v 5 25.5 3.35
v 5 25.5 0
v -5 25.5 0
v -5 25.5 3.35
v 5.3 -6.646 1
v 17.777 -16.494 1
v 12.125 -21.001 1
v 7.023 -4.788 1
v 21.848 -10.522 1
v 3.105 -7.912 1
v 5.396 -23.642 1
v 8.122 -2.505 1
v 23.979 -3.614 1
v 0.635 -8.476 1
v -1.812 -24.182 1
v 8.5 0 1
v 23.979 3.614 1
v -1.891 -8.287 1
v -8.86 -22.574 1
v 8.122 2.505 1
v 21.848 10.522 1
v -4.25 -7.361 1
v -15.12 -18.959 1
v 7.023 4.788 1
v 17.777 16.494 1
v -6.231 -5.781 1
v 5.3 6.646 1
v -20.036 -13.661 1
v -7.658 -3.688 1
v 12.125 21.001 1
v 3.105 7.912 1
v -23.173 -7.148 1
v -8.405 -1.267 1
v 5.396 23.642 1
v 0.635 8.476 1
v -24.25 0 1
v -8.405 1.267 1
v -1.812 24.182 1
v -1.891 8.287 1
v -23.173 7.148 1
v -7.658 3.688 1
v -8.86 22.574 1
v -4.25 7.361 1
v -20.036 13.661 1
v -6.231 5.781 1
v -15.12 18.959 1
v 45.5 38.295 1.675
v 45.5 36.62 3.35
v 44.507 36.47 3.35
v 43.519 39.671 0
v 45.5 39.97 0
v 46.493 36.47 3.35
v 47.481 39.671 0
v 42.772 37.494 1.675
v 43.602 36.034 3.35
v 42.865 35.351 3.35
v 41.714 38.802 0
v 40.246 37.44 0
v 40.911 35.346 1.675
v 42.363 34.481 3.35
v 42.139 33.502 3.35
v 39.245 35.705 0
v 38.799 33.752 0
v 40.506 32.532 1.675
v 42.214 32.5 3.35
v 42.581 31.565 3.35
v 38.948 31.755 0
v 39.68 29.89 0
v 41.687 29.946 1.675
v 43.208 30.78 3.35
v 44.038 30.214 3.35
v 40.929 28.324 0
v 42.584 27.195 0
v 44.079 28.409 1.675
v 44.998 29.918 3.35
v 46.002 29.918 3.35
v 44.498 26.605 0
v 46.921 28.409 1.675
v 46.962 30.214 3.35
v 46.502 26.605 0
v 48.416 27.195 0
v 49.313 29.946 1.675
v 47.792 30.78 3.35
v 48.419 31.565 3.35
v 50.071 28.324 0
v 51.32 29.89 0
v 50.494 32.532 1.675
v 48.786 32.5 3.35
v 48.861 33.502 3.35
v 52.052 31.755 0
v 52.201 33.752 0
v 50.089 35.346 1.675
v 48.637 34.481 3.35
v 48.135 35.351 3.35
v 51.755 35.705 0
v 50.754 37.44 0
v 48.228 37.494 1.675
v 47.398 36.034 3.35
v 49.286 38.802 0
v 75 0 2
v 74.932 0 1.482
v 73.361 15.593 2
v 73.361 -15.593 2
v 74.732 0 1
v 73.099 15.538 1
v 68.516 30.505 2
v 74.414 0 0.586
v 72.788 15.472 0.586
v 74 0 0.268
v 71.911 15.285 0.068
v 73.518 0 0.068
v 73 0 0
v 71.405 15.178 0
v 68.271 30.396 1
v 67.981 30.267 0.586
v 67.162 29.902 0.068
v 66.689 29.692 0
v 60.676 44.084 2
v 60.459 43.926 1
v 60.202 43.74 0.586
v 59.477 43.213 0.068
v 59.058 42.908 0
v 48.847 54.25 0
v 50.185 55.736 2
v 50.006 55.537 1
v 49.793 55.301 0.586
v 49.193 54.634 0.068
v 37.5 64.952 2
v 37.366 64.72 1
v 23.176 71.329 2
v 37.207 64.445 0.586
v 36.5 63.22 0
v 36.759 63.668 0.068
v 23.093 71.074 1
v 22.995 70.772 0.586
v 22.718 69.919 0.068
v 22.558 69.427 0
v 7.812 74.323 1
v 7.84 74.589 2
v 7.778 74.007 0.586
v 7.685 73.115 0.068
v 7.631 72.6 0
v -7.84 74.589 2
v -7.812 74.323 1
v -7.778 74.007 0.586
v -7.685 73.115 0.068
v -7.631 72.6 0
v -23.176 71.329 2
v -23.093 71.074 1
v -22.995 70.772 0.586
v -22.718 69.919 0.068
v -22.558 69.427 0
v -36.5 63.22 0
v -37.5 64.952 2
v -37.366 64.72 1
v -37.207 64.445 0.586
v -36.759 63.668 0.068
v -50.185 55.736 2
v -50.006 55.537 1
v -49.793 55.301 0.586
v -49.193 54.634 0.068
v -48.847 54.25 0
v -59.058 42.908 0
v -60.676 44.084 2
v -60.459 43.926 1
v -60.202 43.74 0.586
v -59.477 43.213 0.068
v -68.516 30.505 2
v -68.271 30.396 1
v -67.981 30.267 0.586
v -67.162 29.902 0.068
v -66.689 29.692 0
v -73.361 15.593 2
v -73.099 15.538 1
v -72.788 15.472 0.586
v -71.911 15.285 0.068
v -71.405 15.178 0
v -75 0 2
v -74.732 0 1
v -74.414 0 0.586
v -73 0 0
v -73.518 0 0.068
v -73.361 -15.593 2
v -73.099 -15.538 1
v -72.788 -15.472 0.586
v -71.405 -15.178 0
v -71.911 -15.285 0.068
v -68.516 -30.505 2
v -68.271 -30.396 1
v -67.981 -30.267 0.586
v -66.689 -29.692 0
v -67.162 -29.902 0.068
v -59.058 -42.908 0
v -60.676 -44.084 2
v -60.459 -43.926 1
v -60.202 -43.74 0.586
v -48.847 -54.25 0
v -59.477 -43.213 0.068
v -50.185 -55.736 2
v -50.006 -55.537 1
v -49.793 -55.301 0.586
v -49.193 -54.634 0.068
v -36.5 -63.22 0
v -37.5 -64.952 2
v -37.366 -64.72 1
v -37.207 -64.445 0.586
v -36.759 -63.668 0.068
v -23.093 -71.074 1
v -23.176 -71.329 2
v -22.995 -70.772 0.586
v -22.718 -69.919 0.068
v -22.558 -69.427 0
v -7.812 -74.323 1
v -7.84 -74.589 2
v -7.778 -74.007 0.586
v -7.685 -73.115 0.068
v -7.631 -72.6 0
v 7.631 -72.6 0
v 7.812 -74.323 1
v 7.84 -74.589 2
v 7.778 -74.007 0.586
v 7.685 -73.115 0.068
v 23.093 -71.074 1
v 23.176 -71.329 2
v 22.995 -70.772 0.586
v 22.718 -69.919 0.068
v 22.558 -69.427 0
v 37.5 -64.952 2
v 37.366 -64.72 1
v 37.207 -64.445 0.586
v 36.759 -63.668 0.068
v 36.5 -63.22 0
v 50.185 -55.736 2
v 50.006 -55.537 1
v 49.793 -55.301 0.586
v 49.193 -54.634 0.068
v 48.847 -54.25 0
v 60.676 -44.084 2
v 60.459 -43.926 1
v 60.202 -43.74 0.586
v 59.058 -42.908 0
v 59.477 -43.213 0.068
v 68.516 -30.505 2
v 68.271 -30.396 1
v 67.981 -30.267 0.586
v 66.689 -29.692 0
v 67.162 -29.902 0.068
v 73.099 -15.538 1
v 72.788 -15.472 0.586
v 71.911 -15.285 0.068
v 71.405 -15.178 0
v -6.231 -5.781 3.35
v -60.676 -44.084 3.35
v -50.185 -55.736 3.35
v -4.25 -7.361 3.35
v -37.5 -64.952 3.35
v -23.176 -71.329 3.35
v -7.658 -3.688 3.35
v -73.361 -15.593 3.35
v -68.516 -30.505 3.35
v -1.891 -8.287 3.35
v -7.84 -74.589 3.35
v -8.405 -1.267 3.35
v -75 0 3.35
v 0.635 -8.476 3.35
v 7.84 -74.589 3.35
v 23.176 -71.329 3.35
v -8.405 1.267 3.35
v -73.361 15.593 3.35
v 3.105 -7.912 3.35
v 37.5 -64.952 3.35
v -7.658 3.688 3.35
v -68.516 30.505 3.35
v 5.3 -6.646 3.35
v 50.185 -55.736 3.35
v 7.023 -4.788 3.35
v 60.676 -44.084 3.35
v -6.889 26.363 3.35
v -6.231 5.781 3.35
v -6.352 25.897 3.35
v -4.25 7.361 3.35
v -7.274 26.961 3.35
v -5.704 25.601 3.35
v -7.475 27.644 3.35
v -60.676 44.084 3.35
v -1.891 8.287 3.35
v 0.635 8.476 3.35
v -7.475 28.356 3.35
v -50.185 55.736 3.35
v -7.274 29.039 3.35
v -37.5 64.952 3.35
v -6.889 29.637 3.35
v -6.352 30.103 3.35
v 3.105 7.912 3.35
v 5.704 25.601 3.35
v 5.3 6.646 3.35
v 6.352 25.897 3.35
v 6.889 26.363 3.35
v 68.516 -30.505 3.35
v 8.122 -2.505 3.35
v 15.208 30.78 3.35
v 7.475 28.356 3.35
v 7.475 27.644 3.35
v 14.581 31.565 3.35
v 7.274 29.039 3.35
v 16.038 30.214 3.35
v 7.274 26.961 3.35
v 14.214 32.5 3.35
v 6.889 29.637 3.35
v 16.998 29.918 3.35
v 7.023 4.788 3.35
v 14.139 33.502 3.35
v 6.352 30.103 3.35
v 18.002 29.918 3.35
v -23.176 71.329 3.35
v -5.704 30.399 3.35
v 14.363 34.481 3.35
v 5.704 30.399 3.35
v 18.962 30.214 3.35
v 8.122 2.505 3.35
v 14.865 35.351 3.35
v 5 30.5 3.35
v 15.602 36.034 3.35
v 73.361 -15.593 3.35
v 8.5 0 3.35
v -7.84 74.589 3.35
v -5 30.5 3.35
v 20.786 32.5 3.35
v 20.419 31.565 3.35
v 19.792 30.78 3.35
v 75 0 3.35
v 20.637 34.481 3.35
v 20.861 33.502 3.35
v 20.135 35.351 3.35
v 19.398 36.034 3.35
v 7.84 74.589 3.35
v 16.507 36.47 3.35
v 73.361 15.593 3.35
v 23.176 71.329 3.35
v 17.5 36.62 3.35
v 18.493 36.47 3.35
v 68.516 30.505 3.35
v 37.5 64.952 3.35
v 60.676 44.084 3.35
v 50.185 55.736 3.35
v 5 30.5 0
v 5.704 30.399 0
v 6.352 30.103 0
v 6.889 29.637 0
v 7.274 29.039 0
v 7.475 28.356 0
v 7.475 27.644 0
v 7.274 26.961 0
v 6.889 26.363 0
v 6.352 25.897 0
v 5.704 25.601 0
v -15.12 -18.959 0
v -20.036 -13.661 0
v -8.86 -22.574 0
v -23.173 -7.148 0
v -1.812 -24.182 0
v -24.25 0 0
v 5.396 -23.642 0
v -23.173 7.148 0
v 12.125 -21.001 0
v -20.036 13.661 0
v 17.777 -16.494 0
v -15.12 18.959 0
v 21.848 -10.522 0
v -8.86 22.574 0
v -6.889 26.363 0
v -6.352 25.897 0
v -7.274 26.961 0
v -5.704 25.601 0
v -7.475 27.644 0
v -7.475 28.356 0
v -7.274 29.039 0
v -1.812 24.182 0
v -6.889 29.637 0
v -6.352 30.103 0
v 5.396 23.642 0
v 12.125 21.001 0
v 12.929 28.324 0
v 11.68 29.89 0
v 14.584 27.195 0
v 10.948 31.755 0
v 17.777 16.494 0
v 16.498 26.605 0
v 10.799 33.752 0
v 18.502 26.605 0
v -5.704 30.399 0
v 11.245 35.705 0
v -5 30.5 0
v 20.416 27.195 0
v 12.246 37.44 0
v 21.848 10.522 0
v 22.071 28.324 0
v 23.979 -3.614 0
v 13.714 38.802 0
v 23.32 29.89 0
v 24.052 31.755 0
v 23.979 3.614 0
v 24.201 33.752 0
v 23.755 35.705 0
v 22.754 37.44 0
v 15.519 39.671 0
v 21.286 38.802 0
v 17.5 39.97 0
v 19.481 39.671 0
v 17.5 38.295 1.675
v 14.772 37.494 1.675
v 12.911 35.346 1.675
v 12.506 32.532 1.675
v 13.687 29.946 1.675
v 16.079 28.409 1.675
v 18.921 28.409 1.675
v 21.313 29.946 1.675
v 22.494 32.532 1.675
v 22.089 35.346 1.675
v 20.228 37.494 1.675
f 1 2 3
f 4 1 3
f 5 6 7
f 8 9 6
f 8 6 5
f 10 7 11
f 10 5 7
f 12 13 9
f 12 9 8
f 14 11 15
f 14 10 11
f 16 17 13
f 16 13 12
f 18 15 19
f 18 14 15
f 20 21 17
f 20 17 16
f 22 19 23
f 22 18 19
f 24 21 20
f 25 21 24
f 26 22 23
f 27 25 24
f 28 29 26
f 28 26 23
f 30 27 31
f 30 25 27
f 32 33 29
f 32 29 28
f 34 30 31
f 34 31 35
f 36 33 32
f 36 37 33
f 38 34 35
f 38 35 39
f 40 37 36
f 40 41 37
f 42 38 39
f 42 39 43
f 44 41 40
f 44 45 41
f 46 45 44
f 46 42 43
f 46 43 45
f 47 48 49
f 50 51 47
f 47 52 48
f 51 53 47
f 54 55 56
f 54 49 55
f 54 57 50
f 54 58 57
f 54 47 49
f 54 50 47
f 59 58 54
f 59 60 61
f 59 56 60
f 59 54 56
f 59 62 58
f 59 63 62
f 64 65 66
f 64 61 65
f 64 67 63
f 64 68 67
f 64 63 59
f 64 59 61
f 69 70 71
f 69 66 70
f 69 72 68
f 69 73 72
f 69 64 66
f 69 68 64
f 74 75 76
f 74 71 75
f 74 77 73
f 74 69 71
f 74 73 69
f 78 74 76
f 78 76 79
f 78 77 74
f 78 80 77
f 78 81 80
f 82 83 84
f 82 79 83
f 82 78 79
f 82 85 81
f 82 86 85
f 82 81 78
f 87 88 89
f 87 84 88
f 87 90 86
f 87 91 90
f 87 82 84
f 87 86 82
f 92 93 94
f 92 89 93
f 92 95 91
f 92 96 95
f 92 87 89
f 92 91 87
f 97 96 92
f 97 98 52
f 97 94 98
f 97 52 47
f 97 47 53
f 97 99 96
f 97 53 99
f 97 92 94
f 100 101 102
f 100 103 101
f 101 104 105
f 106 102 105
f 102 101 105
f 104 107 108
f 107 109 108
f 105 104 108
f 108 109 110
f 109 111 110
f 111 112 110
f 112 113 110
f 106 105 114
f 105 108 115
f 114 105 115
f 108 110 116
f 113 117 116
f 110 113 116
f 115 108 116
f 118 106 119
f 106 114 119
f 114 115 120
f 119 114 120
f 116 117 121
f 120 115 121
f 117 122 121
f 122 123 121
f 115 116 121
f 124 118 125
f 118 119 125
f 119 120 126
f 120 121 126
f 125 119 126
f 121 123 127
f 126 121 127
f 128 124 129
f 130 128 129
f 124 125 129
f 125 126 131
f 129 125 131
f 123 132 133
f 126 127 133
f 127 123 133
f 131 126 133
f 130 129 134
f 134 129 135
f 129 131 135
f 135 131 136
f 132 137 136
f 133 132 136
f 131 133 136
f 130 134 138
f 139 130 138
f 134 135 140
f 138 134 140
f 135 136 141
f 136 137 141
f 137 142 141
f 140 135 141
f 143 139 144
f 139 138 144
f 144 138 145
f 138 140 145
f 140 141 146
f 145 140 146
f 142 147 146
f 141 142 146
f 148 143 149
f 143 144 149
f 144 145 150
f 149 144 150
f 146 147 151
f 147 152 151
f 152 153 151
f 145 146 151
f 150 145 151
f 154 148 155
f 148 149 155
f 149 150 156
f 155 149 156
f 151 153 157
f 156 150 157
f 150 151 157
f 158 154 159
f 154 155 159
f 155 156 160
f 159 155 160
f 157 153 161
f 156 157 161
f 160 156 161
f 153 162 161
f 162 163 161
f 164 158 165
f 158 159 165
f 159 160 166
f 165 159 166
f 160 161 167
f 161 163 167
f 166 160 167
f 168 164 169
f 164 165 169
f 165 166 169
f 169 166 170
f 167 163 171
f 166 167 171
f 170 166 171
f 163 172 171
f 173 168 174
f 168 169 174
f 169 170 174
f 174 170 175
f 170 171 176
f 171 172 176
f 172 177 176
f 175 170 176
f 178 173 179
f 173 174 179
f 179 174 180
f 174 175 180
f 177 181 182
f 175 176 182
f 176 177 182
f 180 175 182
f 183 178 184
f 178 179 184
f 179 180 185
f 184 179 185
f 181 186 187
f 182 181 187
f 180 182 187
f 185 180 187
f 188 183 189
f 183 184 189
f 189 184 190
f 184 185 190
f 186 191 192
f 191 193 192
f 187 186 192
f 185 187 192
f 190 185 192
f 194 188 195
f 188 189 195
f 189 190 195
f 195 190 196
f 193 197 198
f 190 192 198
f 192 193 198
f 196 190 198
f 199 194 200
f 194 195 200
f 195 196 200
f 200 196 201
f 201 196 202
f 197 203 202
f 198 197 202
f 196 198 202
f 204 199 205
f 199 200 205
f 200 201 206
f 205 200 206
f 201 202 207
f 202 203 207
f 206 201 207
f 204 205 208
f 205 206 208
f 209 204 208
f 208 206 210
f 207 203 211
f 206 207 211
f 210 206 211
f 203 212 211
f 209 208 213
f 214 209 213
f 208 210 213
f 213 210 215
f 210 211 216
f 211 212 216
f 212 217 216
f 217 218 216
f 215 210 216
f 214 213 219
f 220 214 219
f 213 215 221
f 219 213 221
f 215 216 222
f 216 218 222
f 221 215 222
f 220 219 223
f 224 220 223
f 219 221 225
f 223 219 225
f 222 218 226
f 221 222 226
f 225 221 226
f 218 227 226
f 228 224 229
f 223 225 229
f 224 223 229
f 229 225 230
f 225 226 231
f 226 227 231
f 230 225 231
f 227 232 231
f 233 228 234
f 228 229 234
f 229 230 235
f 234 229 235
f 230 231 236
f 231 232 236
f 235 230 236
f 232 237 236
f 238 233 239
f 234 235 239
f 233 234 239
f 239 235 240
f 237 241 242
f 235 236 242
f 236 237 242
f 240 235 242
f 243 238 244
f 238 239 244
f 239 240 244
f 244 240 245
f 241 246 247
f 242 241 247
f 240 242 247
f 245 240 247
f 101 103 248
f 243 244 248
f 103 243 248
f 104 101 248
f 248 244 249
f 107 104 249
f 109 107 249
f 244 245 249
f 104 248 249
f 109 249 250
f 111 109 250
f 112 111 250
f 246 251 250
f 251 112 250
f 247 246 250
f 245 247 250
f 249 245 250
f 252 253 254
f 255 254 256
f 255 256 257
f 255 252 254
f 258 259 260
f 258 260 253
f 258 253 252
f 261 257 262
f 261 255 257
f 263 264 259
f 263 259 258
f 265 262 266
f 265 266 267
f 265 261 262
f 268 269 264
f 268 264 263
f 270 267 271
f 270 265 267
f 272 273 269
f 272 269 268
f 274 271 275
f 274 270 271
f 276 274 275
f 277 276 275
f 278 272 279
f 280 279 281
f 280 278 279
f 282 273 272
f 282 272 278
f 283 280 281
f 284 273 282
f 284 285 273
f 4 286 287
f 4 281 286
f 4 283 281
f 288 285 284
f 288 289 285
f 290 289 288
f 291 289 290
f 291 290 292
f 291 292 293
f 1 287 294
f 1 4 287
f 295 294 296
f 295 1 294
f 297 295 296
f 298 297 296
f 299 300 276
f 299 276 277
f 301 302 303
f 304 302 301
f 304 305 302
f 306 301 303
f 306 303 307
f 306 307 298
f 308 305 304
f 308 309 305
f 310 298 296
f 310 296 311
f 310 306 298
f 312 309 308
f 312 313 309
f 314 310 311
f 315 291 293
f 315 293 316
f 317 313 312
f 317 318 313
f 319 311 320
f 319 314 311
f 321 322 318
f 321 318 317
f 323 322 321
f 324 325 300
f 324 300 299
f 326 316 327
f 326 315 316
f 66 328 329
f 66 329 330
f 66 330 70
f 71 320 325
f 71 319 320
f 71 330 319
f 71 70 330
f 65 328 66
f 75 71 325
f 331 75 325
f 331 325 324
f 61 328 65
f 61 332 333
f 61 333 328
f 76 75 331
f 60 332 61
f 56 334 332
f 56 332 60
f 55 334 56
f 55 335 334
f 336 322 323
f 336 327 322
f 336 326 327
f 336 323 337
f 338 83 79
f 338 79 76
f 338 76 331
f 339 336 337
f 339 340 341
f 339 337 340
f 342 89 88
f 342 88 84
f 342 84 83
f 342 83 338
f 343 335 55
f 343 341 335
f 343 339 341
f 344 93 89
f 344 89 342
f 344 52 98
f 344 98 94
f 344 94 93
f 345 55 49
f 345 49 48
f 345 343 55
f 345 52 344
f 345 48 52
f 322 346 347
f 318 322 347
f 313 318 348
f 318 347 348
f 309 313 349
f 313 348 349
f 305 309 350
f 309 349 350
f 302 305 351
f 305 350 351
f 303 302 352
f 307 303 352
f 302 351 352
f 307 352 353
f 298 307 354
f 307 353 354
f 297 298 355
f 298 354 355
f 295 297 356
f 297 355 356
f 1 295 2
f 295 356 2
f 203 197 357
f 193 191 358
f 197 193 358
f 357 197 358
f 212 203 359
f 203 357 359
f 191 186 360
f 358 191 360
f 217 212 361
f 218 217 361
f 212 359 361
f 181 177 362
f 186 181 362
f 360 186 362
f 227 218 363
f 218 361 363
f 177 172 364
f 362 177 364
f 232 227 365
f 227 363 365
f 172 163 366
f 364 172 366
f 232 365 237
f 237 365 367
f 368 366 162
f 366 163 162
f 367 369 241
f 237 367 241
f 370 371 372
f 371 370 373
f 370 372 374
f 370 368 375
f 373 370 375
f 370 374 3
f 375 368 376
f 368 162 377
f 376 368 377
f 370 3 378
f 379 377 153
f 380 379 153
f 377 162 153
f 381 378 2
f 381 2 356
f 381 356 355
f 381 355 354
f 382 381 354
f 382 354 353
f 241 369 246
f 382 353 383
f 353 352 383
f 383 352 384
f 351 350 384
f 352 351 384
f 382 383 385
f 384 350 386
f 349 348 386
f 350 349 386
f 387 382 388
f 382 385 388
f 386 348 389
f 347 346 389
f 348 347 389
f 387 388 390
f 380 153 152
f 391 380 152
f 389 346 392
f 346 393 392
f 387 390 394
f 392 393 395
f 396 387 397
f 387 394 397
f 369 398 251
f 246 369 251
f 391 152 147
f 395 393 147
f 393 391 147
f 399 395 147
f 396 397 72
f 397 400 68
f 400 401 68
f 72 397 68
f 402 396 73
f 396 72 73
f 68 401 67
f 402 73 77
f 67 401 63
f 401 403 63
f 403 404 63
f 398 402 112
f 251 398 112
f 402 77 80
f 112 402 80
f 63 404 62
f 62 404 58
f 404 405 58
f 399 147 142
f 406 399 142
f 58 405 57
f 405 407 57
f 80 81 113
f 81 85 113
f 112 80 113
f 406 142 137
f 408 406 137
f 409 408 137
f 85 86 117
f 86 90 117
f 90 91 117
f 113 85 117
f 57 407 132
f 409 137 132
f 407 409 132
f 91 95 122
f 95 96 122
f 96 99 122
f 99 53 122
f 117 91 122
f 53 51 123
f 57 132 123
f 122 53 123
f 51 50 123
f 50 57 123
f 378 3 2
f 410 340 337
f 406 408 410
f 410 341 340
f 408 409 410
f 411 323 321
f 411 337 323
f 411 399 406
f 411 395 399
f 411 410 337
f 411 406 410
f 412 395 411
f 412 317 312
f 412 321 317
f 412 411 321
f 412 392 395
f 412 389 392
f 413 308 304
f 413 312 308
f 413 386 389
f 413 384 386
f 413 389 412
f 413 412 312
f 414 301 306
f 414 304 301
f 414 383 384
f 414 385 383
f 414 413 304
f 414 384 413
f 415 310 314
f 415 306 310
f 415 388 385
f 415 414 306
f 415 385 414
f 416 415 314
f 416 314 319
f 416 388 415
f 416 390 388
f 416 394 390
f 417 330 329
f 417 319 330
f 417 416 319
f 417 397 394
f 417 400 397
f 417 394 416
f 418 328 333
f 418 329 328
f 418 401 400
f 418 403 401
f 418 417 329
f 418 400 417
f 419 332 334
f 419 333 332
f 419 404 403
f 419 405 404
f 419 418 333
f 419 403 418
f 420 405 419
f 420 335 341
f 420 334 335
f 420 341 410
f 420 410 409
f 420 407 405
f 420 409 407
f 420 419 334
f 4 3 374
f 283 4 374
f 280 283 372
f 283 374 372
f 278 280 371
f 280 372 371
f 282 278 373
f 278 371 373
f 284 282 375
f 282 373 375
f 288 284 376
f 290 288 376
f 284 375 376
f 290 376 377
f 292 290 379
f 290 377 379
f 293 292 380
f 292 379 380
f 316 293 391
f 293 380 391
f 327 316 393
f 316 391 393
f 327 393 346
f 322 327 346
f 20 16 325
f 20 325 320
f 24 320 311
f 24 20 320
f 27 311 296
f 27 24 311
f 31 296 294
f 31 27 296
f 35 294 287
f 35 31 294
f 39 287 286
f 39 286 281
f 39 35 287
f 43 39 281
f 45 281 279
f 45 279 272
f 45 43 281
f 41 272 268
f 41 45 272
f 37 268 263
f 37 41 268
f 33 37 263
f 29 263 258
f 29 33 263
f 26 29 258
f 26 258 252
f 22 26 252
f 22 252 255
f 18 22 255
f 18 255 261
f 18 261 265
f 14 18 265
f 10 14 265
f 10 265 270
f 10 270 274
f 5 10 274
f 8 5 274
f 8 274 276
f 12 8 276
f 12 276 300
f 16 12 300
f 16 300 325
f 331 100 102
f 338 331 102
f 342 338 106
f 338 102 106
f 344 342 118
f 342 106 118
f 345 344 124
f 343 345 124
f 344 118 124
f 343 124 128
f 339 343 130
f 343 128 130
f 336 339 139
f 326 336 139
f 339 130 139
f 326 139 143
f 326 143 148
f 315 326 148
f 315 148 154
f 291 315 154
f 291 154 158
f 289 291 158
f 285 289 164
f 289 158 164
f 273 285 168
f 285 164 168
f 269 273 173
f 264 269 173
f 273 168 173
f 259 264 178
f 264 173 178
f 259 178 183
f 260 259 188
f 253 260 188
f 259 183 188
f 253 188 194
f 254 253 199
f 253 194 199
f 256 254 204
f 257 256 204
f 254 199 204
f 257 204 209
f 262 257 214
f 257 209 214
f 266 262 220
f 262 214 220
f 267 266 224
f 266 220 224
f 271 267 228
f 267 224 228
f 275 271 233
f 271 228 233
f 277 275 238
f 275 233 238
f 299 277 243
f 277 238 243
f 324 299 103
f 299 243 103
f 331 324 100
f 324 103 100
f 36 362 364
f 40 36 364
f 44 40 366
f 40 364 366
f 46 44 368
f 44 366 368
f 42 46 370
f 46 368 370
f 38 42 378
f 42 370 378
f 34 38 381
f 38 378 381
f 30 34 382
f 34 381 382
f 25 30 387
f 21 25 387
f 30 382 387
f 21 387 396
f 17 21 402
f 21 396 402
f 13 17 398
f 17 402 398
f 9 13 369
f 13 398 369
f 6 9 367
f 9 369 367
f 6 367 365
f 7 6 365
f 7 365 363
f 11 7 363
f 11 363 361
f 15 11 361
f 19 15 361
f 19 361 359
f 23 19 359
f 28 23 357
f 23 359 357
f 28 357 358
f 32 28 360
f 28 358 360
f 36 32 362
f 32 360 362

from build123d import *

# Parameters (mm, degrees)
ESBO_O1_R             = 75
ESBO_O1_R_2           = 8.5
EXTRUS_O1_DEPTH       = 3.35
ESBO_O2_R             = 24.25
CORTE_EXTRUS_O1_DEPTH = 1
CORTE_EXTRUS_O3_DEPTH = 10
LPATTERN3_COUNT       = 2
LPATTERN3_PITCH       = 28
FILETE1_R             = 2


with BuildPart() as part:
    # Esboço1 → Extrusão1 (new body)
    with BuildSketch(Plane.XY):
        Circle(ESBO_O1_R)
        Circle(ESBO_O1_R_2, mode=Mode.SUBTRACT)
    extrude(amount=EXTRUS_O1_DEPTH)

    # Esboço2 → Corte-extrusão1 (cut)
    with BuildSketch(Plane(origin=(0, 0, 0), x_dir=(-1, 0, 0), z_dir=(0, 0, -1))):
        Circle(ESBO_O2_R)
    extrude(amount=-CORTE_EXTRUS_O1_DEPTH, mode=Mode.SUBTRACT)

    # Esboço6 → Corte-extrusão3 (cut)
    with BuildSketch(Plane(origin=(0, 0, 0), x_dir=(-1, 0, 0), z_dir=(0, 0, -1))):
        with BuildLine():
            Line((-5, 25.5), (5, 25.5))
            ThreePointArc((5, 25.5), (7.5, 28), (5, 30.5))
            Line((5, 30.5), (-5, 30.5))
            ThreePointArc((-5, 30.5), (-7.5, 28), (-5, 25.5))
        make_face()
    extrude(amount=-CORTE_EXTRUS_O3_DEPTH, mode=Mode.SUBTRACT)

    # Esboço8 → Escareado para SFHCS M63 (revolve, cut)
    with BuildSketch(Plane(origin=(17.5, 33.25, 0), x_dir=(0, 1, 0), z_dir=(1, 0, 0))):
        Polygon((0, 0), (0, 3.35), (3.3, 3.35), (3.3, 3.42), (6.72, 0), align=None)
    escareado_para_sfhcs_m63 = revolve(axis=Axis((17.5, 33.25, -6.35), (0, 0, 1)), mode=Mode.SUBTRACT)

    # LPattern3: Escareado para SFHCS M63 ×2
    with Locations(*[(i * LPATTERN3_PITCH, 0, 0) for i in range(1, LPATTERN3_COUNT)]):
        add(escareado_para_sfhcs_m63, mode=Mode.SUBTRACT)

    # Filete1
    filete1_edges = [part.edges().sort_by_distance(p)[0] for p in [
        (-75, 0, 0),
    ]]
    fillet(filete1_edges, radius=FILETE1_R)


solid = part.part
